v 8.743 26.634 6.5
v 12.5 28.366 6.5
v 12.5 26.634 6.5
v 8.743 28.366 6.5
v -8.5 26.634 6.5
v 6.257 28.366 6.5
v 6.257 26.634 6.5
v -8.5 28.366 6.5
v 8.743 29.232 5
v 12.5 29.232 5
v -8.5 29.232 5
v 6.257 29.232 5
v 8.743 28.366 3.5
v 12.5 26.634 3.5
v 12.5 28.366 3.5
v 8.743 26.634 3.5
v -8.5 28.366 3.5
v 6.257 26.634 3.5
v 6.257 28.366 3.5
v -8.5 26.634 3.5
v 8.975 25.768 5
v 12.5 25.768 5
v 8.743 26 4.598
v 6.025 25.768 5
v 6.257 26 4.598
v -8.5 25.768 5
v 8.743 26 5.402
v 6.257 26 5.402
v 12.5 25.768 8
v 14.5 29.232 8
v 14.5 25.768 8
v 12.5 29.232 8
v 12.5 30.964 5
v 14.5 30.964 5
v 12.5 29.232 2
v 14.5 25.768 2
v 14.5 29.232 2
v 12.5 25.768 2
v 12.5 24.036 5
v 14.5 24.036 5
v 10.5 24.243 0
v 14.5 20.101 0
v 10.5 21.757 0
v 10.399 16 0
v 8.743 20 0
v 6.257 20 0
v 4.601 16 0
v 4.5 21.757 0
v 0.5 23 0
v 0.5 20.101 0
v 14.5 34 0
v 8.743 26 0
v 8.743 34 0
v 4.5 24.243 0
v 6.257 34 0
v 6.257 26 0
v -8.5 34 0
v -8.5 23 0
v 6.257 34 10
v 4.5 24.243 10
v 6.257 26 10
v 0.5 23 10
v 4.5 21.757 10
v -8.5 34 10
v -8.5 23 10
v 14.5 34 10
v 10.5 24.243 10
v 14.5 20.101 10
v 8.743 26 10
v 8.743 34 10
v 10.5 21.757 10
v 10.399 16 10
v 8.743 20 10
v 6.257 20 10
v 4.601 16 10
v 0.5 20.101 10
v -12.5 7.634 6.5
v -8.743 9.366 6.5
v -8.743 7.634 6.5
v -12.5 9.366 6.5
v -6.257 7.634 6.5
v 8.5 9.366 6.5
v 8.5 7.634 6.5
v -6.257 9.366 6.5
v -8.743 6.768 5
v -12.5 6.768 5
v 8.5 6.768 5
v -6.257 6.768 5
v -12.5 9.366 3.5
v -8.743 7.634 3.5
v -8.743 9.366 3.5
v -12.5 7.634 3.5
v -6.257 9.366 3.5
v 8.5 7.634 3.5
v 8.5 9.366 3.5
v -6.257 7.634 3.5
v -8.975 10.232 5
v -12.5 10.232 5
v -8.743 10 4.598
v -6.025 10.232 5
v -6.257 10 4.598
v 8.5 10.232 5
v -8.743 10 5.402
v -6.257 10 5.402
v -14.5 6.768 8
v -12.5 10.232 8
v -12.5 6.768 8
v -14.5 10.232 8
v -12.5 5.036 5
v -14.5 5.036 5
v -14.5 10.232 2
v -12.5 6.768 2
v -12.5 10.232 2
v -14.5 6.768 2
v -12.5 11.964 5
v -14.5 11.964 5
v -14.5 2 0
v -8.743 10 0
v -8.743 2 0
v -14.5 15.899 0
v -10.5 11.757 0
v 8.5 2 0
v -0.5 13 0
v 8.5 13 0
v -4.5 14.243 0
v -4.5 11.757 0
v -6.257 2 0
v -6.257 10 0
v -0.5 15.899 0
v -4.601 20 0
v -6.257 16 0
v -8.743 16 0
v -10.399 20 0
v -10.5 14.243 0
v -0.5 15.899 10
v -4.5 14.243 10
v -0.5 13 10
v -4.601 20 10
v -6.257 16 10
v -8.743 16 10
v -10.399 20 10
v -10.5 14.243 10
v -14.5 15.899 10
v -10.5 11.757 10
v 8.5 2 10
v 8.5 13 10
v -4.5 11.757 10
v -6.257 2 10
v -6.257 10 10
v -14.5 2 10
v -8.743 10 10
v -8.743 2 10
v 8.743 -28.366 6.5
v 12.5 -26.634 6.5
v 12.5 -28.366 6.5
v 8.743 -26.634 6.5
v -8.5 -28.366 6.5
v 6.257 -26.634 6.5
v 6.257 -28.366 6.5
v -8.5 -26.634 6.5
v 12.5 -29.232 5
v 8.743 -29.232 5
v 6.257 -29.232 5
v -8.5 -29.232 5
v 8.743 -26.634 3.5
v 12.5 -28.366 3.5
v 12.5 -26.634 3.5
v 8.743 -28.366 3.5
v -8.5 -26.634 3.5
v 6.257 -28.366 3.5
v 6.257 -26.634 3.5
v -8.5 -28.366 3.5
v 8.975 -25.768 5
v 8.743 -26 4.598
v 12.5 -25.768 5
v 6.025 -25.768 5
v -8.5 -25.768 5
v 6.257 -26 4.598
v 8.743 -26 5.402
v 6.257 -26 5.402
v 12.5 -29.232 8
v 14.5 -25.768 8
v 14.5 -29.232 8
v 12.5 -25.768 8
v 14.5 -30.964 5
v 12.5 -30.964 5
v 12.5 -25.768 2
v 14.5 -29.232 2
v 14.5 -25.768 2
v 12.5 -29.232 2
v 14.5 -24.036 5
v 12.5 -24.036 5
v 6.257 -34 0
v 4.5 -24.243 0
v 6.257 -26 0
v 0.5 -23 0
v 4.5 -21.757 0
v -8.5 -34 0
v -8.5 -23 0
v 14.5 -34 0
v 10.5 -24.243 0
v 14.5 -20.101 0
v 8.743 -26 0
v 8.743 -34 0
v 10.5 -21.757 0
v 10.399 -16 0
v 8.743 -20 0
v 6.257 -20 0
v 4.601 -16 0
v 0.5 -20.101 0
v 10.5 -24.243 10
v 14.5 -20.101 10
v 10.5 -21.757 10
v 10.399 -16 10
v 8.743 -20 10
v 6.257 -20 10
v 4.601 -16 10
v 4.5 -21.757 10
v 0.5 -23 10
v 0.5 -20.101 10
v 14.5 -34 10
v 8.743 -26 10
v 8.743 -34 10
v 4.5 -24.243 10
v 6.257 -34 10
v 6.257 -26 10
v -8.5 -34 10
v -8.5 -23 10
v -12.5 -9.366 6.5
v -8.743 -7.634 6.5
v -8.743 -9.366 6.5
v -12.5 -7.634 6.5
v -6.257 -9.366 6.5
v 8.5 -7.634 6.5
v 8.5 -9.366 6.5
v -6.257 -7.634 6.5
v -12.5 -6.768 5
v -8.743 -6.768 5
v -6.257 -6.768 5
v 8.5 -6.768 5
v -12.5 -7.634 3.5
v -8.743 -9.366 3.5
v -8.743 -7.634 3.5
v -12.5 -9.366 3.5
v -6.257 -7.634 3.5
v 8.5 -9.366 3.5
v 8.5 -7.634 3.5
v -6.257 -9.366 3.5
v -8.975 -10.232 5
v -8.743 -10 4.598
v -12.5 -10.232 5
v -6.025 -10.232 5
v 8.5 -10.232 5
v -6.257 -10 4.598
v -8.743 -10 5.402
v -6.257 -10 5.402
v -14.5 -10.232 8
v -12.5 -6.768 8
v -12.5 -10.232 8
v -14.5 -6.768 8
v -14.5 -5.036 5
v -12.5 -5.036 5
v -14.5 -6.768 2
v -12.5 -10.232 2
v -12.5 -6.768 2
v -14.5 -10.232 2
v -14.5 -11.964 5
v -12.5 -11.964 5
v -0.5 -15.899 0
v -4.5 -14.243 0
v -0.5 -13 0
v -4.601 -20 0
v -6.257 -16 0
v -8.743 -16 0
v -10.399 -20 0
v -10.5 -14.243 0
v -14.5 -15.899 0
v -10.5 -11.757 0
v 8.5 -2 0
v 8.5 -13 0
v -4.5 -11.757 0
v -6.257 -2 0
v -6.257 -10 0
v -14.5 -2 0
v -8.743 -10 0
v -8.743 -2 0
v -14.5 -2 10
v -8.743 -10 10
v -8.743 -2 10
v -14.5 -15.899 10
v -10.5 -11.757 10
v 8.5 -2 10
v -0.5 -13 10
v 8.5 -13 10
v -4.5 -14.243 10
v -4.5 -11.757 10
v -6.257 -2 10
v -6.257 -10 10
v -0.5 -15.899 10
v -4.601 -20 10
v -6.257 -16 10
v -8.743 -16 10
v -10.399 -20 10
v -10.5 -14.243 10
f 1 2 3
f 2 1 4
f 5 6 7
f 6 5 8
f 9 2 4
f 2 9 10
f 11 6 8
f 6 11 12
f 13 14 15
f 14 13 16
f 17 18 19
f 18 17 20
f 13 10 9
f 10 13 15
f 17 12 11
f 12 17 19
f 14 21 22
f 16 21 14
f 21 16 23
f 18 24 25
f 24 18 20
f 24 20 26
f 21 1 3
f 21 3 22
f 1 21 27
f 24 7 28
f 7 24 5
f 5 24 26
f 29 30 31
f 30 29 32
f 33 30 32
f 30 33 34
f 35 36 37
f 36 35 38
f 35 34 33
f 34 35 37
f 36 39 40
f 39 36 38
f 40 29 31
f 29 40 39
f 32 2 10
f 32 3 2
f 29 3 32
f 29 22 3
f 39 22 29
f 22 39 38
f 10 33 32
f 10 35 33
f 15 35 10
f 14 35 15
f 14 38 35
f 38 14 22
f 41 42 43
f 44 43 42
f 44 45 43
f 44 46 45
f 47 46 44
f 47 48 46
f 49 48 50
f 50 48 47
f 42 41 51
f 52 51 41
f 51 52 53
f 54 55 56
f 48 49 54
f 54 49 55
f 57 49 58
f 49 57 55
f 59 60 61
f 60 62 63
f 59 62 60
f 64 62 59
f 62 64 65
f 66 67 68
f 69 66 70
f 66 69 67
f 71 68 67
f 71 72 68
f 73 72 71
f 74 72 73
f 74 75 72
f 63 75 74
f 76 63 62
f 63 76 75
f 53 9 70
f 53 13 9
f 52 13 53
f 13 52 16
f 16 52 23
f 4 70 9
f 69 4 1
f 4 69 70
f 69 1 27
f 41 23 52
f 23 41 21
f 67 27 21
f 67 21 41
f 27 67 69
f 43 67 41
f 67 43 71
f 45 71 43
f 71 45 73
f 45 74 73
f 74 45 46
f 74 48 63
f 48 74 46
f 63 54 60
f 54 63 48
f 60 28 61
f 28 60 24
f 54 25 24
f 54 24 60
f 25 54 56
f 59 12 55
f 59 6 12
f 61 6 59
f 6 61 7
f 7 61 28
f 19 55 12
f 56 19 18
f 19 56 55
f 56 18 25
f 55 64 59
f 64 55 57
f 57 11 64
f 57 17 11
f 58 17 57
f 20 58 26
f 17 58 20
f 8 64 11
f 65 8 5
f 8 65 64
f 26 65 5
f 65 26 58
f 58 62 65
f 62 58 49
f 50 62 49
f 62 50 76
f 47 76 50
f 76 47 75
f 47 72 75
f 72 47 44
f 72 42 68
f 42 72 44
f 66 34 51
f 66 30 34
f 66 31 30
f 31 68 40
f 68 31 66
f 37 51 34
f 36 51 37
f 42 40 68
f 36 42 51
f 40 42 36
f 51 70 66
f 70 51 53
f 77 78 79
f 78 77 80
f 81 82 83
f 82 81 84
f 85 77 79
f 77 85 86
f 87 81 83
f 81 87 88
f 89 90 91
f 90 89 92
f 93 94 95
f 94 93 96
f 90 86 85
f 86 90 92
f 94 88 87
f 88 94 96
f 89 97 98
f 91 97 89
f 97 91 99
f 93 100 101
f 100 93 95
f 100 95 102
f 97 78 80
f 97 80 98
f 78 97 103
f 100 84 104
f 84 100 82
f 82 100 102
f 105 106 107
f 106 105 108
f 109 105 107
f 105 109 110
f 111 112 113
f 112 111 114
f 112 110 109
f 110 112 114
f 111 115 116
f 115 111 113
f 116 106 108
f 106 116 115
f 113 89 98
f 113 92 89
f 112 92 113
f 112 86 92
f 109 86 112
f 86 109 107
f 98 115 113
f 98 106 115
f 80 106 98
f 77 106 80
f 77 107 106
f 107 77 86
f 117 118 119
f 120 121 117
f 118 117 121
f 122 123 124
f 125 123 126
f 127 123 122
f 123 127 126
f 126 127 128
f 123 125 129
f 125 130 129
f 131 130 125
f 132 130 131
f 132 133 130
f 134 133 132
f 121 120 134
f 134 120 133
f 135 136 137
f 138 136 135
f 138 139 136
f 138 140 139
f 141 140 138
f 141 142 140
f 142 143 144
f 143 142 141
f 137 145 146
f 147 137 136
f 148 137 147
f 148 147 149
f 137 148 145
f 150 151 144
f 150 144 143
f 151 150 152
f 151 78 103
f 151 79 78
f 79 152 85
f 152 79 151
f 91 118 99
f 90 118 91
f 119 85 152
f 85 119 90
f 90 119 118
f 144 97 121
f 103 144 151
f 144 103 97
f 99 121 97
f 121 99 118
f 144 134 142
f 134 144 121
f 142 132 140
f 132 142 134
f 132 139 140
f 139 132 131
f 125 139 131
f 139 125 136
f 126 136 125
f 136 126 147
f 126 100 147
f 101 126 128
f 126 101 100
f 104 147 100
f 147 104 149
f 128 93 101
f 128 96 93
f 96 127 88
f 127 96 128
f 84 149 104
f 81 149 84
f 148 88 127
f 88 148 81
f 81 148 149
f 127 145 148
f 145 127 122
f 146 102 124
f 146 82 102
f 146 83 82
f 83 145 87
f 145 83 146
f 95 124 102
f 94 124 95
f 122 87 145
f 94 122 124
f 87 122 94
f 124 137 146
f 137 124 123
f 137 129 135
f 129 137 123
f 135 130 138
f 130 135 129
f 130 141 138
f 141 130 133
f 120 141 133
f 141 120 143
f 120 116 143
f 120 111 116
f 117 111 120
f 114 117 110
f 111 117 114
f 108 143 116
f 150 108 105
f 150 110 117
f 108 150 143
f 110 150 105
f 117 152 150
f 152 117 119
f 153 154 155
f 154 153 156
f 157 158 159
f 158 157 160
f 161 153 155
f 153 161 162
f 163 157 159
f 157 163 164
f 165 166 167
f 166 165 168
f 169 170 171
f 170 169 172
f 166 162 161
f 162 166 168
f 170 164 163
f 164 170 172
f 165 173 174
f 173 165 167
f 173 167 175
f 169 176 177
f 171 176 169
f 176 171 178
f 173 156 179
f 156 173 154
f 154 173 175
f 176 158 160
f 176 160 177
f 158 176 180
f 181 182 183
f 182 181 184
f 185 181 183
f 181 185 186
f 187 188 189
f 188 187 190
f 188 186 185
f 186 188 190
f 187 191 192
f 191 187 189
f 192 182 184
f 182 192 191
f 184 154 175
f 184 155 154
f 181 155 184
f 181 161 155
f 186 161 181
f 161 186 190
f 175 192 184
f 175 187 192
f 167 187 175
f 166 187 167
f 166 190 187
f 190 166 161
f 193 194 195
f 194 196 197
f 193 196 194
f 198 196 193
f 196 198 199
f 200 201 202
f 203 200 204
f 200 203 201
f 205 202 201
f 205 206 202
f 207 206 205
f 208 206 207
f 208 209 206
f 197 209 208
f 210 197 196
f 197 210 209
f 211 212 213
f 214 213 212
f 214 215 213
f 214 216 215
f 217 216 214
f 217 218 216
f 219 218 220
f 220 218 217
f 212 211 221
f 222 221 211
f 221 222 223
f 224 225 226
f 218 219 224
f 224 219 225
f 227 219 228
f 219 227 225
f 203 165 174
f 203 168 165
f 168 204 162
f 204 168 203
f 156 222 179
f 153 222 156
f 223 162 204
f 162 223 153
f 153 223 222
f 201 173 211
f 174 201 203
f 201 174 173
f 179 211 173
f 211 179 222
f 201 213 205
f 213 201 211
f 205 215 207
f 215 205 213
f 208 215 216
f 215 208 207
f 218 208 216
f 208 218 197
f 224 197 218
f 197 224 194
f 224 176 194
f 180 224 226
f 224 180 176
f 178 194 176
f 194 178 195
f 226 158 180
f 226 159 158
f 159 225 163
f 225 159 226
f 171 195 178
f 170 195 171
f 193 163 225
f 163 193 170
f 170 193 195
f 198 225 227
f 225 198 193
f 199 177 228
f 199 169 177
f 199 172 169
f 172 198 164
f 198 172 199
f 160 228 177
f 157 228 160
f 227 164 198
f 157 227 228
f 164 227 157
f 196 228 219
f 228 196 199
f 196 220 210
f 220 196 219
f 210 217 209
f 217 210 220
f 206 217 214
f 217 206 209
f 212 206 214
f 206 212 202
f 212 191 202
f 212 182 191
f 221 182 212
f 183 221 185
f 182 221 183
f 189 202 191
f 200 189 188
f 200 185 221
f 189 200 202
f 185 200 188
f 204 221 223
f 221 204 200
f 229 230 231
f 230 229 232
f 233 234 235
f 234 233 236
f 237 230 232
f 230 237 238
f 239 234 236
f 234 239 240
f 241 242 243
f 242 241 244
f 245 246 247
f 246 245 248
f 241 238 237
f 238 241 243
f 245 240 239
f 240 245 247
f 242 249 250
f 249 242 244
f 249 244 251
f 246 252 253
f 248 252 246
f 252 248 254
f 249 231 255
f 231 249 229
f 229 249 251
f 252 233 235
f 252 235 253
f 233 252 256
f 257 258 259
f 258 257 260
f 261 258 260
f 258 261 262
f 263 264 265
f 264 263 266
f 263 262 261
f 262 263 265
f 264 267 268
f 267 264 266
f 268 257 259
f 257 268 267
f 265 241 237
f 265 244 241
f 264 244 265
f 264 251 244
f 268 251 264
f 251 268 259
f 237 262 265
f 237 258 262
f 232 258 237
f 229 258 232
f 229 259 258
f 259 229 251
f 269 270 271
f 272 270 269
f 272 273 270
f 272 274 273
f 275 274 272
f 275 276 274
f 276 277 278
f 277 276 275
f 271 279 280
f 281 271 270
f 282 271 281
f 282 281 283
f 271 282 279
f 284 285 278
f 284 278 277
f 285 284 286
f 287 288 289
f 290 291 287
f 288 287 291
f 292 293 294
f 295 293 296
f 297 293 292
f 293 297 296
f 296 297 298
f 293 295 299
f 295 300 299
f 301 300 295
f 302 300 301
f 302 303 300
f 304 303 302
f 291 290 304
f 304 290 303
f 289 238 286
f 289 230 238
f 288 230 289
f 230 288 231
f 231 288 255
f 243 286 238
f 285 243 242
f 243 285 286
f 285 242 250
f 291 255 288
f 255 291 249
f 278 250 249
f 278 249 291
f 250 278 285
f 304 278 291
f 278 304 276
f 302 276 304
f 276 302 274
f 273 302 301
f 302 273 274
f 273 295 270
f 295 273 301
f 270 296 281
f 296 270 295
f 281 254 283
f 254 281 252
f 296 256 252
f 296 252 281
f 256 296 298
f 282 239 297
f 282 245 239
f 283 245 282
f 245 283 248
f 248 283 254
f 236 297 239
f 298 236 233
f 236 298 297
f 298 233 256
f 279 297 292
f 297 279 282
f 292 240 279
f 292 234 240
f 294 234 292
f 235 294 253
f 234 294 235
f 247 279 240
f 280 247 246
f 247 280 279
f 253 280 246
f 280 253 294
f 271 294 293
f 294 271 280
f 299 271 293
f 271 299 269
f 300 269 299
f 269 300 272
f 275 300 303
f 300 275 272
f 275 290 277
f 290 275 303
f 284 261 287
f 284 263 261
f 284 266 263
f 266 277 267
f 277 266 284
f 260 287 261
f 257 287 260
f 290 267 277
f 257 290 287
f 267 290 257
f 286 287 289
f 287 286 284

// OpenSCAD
include <wallace.scad>;

!for(b = [0:1]) mirror([0, b, 0]) for(a = [-1,1]) translate([a * -7.5, 18 - 5 * a, 0]) rotate(180 + 90 * a) bed_mount();
